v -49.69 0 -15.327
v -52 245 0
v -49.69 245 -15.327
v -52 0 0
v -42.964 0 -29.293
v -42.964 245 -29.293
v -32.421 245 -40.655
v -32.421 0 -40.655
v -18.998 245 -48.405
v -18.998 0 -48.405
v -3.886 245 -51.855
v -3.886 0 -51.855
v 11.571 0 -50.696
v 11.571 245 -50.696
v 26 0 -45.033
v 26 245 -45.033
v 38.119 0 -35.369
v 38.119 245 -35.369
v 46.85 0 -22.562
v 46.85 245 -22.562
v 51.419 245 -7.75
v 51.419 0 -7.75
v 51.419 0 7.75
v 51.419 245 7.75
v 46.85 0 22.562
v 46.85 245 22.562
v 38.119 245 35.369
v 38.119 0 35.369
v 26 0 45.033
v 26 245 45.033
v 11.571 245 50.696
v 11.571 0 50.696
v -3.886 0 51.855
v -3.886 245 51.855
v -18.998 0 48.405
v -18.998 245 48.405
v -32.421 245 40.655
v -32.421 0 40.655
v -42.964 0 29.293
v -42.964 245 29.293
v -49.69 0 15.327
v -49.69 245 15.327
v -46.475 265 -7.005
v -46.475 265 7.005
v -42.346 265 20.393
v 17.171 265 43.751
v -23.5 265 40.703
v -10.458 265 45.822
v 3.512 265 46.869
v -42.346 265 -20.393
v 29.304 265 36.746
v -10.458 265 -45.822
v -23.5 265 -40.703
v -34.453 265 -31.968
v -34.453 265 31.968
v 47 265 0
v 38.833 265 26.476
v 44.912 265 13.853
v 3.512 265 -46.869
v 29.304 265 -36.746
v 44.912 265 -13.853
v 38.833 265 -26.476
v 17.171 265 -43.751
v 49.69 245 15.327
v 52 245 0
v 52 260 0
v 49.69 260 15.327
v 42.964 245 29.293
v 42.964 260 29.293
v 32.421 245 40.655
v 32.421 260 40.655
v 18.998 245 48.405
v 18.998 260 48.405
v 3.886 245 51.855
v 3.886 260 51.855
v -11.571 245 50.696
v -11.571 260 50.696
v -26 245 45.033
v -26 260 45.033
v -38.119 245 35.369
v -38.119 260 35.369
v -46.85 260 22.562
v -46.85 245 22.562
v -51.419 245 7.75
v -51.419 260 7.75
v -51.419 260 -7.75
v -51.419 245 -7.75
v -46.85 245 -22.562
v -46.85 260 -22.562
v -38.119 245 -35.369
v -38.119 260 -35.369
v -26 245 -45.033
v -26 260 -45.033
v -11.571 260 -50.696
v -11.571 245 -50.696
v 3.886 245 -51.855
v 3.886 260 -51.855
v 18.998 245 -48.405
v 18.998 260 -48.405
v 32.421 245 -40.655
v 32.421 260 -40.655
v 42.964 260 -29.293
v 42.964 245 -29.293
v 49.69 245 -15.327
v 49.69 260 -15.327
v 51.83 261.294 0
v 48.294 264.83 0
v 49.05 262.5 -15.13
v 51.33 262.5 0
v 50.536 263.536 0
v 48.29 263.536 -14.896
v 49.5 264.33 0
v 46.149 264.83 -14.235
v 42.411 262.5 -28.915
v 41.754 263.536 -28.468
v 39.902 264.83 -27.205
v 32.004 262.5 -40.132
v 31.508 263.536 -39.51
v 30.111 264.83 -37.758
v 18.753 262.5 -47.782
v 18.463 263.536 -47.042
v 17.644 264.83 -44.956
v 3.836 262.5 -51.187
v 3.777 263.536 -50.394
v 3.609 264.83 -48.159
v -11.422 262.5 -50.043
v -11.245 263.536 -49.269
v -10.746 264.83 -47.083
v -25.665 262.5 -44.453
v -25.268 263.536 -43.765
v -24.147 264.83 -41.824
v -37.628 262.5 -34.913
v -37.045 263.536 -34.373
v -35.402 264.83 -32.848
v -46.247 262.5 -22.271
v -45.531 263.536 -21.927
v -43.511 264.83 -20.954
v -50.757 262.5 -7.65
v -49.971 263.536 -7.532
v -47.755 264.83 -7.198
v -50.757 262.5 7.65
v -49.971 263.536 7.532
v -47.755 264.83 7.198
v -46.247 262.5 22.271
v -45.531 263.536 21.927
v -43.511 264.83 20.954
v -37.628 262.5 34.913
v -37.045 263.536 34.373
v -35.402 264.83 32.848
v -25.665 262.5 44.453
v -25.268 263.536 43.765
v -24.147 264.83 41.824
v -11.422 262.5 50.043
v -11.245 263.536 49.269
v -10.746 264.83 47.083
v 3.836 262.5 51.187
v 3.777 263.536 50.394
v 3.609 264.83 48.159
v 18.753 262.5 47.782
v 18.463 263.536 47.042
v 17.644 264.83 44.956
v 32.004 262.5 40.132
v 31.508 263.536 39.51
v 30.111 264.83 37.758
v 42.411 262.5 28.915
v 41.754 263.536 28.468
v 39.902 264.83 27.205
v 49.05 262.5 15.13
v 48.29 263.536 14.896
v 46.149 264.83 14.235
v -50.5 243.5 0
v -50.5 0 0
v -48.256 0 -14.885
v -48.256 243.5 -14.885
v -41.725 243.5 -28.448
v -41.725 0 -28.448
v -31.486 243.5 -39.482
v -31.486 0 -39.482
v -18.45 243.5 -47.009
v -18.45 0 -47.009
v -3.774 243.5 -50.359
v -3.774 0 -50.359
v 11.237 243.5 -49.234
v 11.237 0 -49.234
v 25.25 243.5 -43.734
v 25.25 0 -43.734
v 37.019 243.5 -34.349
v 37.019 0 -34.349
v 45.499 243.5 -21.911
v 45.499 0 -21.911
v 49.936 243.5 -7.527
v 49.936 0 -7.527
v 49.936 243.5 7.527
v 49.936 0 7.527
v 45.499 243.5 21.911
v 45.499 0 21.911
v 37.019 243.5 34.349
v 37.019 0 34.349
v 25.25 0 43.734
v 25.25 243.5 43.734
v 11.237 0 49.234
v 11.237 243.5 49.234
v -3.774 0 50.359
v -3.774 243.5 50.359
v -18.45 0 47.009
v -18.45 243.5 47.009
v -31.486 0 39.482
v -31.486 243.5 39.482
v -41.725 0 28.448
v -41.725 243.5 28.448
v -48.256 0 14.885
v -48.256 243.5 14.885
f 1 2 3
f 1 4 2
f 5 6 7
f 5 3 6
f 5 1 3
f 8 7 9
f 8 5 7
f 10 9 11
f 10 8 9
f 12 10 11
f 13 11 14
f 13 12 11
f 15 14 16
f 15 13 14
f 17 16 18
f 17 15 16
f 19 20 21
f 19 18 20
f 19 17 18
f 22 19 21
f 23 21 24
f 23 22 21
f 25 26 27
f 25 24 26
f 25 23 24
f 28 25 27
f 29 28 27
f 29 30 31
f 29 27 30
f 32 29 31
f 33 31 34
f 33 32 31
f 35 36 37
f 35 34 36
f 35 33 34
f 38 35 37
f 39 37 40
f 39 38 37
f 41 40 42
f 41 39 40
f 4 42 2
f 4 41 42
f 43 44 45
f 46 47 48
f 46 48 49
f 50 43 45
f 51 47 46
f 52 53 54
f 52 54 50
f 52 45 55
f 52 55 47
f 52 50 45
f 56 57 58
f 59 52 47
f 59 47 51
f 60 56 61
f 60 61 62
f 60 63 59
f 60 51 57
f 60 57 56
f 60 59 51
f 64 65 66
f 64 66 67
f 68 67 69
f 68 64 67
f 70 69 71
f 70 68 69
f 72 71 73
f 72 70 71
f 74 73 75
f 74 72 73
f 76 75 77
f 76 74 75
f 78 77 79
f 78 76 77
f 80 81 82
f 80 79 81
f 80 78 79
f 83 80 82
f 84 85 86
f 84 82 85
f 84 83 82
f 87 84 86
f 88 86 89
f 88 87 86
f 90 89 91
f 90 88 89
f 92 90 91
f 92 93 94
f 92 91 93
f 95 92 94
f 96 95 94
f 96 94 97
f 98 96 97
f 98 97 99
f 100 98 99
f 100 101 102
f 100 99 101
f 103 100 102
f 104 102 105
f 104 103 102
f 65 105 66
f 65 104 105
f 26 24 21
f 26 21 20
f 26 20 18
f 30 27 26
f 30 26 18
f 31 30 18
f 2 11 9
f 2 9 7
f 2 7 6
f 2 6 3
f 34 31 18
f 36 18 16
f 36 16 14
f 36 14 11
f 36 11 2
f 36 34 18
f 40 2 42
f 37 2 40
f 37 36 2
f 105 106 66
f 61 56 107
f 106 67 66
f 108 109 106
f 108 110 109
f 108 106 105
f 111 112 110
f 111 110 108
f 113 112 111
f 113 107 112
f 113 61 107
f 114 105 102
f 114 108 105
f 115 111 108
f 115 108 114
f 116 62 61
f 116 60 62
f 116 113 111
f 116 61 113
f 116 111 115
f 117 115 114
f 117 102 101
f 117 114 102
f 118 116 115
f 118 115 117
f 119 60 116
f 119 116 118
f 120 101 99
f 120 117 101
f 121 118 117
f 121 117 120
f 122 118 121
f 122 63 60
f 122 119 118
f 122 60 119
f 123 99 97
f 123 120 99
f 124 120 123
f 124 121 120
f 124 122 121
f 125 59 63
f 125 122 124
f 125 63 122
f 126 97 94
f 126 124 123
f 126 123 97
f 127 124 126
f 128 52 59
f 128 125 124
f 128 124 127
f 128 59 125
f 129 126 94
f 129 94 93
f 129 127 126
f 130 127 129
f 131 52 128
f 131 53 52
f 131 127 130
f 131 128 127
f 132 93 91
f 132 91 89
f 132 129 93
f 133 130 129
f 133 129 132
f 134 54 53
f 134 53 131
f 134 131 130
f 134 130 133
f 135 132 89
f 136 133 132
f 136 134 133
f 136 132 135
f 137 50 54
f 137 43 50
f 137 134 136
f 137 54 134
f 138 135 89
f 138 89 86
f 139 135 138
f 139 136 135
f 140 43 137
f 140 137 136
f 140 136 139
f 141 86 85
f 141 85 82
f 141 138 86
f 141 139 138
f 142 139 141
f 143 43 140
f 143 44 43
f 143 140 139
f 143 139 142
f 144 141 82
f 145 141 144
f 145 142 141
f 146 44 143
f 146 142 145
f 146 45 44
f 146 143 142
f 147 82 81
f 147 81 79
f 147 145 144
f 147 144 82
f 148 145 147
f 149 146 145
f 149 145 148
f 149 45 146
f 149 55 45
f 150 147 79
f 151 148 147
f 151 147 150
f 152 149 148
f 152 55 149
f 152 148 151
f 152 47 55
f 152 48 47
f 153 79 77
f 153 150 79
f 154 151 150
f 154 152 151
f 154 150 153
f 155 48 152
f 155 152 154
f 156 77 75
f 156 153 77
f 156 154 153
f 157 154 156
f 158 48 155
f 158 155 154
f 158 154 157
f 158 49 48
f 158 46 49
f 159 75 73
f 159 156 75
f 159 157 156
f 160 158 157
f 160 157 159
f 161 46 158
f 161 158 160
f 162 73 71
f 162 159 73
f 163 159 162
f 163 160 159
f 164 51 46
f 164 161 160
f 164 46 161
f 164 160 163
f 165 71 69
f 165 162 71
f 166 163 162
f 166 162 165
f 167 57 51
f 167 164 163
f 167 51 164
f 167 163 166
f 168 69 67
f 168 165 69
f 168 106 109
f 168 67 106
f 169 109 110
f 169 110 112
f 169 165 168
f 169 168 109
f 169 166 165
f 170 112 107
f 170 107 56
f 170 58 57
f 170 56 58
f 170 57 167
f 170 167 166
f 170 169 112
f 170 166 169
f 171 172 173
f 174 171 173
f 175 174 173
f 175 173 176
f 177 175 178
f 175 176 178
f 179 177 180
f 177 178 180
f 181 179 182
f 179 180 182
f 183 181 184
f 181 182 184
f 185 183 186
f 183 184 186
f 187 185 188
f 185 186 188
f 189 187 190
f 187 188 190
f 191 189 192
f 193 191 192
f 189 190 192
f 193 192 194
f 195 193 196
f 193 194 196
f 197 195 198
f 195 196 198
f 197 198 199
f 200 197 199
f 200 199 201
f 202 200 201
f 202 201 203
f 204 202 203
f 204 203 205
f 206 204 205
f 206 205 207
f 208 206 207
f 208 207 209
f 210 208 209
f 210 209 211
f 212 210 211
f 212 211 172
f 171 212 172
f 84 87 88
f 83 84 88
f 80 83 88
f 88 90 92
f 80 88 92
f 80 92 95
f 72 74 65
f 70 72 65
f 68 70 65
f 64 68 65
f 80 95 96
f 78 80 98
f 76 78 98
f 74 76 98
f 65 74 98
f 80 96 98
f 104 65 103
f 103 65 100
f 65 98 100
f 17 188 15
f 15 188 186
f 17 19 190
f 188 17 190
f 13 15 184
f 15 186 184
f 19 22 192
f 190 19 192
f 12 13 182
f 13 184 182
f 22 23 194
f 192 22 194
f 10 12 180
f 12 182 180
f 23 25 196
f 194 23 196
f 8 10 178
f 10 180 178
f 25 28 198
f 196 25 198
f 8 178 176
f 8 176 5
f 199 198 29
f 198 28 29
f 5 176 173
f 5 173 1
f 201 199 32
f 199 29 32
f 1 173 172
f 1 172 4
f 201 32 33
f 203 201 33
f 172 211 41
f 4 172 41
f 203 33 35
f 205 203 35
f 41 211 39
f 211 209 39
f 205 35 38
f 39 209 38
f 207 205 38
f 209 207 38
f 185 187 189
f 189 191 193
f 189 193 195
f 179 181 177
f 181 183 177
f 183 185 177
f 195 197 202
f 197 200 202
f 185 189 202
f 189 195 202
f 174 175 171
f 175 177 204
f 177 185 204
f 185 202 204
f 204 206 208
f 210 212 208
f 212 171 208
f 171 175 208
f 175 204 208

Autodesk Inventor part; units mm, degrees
ref_plane "YZ Plane" through (0, 0, 0) normal (1, 0, 0) x (0, 1, 0)
ref_plane "XZ Plane" through (0, 0, 0) normal (0, 1, 0) x (-1, 0, 0)
ref_plane "XY Plane" through (0, 0, 0) normal (0, 0, 1) x (1, 0, 0)
sketch "Sketch1" plane through (0, 0, 0) normal (0, 1, 0) x (-1, 0, 0)
  circle A0 centre (0, 0) radius 52
  dimension "d0" = 104
extrude "Extrusion1" add sketch "Sketch1" along normal blind 245
shell "Shell1" thickness 1.5 removed faces 1 at (-18.5271, 0, 25.061)
sketch "Sketch2" plane through (0, 245, 0) normal (0, 1, 0) x (1, 0, 0)
  circle A0 centre (0, 0) radius 52 projected
  circle A1 centre (0, 0) radius 52
extrude "Extrusion2" add sketch "Sketch2" along normal blind 20 separate body
fillet "Fillet1" radius 5 1 edges at (-52, 265, 0)
properties part number "Jar" material "Polycarbonate, Clear"
